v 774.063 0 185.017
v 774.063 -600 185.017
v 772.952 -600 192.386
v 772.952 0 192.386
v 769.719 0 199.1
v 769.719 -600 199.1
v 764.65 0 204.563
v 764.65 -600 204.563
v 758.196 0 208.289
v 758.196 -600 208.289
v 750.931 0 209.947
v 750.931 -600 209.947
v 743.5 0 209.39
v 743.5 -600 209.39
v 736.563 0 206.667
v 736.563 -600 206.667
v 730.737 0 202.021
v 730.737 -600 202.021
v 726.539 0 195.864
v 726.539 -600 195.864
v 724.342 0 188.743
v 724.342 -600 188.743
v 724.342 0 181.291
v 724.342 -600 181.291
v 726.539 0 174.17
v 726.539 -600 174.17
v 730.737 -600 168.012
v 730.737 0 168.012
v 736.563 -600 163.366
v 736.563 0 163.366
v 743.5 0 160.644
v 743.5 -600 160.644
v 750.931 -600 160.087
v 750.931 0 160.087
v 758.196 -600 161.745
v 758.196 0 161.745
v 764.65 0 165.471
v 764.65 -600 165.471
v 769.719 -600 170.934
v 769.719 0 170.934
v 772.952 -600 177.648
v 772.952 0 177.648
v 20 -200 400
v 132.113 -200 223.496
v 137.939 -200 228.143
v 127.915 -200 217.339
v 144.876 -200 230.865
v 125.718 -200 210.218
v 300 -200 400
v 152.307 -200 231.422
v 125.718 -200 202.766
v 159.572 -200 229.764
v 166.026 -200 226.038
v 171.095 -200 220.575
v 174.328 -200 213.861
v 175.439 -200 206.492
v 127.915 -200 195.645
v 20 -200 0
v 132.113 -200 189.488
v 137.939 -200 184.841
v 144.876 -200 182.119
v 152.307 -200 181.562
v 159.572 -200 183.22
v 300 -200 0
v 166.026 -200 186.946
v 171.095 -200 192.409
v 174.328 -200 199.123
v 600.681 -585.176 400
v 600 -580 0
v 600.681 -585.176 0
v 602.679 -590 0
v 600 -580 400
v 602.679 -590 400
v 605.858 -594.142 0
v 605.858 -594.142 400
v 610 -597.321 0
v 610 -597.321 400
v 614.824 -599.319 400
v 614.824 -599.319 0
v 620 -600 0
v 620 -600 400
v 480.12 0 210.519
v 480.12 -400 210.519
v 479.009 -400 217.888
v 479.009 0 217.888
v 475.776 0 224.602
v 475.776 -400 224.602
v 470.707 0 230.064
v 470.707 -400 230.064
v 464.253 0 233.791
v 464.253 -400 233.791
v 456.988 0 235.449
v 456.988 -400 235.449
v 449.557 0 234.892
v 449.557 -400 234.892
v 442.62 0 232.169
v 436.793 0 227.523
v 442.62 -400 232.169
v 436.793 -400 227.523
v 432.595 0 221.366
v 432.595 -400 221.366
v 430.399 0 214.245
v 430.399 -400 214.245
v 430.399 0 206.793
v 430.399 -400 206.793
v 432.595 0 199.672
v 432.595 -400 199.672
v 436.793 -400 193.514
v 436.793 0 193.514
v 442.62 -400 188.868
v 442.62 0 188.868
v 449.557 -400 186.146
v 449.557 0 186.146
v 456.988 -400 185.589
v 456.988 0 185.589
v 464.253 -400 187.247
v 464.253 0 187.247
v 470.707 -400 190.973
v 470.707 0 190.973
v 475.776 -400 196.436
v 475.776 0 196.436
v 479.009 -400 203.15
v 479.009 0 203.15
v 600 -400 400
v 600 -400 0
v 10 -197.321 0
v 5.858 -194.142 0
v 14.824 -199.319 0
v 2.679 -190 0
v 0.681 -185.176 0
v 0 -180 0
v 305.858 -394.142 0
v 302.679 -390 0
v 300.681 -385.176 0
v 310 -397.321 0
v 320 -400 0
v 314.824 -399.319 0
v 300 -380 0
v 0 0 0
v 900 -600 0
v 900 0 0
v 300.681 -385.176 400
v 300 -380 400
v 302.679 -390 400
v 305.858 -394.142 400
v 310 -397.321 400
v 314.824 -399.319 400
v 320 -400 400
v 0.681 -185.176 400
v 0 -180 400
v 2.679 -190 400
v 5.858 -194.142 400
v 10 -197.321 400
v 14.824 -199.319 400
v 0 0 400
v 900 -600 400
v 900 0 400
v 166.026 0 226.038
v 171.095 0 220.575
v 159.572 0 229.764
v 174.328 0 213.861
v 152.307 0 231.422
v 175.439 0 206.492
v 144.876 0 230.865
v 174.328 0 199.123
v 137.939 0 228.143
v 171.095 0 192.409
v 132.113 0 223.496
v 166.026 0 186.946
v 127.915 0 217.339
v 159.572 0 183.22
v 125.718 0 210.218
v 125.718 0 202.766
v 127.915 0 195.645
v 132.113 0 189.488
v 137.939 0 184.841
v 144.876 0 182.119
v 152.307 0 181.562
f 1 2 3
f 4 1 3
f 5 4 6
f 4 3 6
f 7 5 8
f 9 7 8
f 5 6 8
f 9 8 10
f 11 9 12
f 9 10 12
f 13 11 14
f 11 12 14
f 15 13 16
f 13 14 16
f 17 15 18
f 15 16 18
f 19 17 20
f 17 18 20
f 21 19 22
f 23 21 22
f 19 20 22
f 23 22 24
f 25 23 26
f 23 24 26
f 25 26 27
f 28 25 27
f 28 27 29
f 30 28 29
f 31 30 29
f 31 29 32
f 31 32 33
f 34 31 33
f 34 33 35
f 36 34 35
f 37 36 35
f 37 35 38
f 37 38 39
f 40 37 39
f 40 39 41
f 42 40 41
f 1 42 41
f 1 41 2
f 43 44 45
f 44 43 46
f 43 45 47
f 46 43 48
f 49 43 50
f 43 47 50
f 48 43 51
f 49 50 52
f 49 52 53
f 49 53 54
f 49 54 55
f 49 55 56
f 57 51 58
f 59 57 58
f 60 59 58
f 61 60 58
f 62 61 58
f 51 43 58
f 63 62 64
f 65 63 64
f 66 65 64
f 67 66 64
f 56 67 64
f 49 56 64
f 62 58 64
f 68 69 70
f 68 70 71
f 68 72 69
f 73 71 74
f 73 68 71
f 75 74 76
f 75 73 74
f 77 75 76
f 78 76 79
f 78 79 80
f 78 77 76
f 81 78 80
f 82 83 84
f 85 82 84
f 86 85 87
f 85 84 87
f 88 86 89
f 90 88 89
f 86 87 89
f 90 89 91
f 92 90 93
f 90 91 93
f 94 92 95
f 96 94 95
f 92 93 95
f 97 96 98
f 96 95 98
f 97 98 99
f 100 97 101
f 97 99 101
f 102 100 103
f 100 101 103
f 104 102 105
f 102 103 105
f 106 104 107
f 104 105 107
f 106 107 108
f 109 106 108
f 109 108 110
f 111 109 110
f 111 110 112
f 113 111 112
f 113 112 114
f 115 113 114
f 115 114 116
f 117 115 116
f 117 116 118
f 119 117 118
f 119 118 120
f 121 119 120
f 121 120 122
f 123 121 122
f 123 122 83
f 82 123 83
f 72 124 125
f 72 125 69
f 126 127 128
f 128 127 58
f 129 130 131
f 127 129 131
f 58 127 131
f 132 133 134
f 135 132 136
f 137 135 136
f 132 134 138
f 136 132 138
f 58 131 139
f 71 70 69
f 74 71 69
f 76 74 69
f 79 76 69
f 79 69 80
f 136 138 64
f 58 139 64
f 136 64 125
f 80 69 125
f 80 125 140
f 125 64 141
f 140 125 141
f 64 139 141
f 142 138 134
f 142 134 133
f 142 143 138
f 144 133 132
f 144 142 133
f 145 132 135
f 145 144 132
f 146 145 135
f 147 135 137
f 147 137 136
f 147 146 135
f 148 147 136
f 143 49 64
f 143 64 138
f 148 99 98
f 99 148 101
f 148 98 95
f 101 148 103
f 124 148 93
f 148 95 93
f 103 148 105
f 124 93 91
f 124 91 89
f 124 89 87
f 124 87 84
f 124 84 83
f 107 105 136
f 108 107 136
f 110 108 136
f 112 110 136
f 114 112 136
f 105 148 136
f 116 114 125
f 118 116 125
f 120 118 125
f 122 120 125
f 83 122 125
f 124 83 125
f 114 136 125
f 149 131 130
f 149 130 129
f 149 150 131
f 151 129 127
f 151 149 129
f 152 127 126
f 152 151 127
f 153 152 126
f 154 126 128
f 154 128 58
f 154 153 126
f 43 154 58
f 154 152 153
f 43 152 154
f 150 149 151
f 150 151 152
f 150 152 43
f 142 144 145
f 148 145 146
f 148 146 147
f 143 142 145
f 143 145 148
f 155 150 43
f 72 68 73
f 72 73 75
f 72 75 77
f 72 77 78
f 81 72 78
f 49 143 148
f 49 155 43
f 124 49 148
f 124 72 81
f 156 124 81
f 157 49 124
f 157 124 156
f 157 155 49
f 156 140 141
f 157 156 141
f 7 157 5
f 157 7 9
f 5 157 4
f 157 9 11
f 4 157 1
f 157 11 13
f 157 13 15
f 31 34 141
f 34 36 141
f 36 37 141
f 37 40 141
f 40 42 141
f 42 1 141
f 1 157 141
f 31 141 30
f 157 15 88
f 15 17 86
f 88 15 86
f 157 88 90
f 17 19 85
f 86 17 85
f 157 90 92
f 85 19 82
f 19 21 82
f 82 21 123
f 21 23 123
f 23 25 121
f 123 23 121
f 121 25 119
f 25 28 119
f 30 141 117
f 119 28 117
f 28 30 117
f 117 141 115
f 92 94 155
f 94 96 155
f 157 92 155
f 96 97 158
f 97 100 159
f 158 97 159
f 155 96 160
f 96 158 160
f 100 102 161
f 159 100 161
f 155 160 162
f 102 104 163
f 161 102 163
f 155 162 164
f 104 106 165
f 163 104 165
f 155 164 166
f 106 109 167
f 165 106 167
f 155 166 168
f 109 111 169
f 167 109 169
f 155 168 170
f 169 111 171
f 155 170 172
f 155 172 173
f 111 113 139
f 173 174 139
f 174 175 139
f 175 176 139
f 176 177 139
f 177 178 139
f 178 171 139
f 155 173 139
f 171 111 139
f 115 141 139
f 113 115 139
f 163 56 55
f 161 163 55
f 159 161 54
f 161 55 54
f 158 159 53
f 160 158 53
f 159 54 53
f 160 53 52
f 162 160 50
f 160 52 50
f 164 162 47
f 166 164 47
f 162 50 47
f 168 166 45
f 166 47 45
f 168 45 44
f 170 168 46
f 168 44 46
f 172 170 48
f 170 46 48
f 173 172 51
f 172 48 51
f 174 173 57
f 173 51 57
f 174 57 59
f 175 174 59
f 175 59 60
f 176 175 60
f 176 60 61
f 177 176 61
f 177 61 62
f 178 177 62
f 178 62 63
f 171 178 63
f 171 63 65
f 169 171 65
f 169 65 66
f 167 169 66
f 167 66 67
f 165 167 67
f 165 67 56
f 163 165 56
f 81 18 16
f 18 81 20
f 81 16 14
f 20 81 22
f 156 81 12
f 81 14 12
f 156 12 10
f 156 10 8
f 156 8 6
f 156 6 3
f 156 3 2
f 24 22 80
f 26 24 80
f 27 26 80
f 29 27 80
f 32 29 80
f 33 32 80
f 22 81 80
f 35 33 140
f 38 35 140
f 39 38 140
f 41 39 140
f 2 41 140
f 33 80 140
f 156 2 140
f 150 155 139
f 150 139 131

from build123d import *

# Parameters (mm, degrees)
F1_DEPTH = 400
F2_R     = 20
F4_R     = 25
F5_DEPTH = 200.001
F6_R     = 25
F7_DEPTH = 400.001
F8_R     = 25
F9_DEPTH = 600.001


with BuildPart() as f1:
    # F0 (on Top) → F1 (new body)
    with BuildSketch(Plane.XY):
        Polygon((900, 0), (0, 0), (0, -200), (300, -200), (300, -400), (600, -400), (600, -600), (900, -600), align=None)
    extrude(amount=F1_DEPTH)

    # F2
    f2_edges = [f1.edges().sort_by_distance(p)[0] for p in [
        (600, -600, 200),
        (300, -400, 200),
        (0, -200, 200),
    ]]
    fillet(f2_edges, radius=F2_R)

    # F4 (on face) → F5 (cut, through all)
    with BuildSketch(Plane.XZ.offset(200)):
        with Locations((150.4388, 206.492081)):
            Circle(F4_R)
    extrude(amount=-F5_DEPTH, mode=Mode.SUBTRACT)

    # F6 (on face) → F7 (cut, through all)
    with BuildSketch(Plane.XZ.offset(400)):
        with Locations((455.119699, 210.518703)):
            Circle(F6_R)
    extrude(amount=-F7_DEPTH, mode=Mode.SUBTRACT)

    # F8 (on face) → F9 (cut, through all)
    with BuildSketch(Plane.XZ.offset(600)):
        with Locations((749.062896, 185.016781)):
            Circle(F8_R)
    extrude(amount=-F9_DEPTH, mode=Mode.SUBTRACT)


solid = f1.part
